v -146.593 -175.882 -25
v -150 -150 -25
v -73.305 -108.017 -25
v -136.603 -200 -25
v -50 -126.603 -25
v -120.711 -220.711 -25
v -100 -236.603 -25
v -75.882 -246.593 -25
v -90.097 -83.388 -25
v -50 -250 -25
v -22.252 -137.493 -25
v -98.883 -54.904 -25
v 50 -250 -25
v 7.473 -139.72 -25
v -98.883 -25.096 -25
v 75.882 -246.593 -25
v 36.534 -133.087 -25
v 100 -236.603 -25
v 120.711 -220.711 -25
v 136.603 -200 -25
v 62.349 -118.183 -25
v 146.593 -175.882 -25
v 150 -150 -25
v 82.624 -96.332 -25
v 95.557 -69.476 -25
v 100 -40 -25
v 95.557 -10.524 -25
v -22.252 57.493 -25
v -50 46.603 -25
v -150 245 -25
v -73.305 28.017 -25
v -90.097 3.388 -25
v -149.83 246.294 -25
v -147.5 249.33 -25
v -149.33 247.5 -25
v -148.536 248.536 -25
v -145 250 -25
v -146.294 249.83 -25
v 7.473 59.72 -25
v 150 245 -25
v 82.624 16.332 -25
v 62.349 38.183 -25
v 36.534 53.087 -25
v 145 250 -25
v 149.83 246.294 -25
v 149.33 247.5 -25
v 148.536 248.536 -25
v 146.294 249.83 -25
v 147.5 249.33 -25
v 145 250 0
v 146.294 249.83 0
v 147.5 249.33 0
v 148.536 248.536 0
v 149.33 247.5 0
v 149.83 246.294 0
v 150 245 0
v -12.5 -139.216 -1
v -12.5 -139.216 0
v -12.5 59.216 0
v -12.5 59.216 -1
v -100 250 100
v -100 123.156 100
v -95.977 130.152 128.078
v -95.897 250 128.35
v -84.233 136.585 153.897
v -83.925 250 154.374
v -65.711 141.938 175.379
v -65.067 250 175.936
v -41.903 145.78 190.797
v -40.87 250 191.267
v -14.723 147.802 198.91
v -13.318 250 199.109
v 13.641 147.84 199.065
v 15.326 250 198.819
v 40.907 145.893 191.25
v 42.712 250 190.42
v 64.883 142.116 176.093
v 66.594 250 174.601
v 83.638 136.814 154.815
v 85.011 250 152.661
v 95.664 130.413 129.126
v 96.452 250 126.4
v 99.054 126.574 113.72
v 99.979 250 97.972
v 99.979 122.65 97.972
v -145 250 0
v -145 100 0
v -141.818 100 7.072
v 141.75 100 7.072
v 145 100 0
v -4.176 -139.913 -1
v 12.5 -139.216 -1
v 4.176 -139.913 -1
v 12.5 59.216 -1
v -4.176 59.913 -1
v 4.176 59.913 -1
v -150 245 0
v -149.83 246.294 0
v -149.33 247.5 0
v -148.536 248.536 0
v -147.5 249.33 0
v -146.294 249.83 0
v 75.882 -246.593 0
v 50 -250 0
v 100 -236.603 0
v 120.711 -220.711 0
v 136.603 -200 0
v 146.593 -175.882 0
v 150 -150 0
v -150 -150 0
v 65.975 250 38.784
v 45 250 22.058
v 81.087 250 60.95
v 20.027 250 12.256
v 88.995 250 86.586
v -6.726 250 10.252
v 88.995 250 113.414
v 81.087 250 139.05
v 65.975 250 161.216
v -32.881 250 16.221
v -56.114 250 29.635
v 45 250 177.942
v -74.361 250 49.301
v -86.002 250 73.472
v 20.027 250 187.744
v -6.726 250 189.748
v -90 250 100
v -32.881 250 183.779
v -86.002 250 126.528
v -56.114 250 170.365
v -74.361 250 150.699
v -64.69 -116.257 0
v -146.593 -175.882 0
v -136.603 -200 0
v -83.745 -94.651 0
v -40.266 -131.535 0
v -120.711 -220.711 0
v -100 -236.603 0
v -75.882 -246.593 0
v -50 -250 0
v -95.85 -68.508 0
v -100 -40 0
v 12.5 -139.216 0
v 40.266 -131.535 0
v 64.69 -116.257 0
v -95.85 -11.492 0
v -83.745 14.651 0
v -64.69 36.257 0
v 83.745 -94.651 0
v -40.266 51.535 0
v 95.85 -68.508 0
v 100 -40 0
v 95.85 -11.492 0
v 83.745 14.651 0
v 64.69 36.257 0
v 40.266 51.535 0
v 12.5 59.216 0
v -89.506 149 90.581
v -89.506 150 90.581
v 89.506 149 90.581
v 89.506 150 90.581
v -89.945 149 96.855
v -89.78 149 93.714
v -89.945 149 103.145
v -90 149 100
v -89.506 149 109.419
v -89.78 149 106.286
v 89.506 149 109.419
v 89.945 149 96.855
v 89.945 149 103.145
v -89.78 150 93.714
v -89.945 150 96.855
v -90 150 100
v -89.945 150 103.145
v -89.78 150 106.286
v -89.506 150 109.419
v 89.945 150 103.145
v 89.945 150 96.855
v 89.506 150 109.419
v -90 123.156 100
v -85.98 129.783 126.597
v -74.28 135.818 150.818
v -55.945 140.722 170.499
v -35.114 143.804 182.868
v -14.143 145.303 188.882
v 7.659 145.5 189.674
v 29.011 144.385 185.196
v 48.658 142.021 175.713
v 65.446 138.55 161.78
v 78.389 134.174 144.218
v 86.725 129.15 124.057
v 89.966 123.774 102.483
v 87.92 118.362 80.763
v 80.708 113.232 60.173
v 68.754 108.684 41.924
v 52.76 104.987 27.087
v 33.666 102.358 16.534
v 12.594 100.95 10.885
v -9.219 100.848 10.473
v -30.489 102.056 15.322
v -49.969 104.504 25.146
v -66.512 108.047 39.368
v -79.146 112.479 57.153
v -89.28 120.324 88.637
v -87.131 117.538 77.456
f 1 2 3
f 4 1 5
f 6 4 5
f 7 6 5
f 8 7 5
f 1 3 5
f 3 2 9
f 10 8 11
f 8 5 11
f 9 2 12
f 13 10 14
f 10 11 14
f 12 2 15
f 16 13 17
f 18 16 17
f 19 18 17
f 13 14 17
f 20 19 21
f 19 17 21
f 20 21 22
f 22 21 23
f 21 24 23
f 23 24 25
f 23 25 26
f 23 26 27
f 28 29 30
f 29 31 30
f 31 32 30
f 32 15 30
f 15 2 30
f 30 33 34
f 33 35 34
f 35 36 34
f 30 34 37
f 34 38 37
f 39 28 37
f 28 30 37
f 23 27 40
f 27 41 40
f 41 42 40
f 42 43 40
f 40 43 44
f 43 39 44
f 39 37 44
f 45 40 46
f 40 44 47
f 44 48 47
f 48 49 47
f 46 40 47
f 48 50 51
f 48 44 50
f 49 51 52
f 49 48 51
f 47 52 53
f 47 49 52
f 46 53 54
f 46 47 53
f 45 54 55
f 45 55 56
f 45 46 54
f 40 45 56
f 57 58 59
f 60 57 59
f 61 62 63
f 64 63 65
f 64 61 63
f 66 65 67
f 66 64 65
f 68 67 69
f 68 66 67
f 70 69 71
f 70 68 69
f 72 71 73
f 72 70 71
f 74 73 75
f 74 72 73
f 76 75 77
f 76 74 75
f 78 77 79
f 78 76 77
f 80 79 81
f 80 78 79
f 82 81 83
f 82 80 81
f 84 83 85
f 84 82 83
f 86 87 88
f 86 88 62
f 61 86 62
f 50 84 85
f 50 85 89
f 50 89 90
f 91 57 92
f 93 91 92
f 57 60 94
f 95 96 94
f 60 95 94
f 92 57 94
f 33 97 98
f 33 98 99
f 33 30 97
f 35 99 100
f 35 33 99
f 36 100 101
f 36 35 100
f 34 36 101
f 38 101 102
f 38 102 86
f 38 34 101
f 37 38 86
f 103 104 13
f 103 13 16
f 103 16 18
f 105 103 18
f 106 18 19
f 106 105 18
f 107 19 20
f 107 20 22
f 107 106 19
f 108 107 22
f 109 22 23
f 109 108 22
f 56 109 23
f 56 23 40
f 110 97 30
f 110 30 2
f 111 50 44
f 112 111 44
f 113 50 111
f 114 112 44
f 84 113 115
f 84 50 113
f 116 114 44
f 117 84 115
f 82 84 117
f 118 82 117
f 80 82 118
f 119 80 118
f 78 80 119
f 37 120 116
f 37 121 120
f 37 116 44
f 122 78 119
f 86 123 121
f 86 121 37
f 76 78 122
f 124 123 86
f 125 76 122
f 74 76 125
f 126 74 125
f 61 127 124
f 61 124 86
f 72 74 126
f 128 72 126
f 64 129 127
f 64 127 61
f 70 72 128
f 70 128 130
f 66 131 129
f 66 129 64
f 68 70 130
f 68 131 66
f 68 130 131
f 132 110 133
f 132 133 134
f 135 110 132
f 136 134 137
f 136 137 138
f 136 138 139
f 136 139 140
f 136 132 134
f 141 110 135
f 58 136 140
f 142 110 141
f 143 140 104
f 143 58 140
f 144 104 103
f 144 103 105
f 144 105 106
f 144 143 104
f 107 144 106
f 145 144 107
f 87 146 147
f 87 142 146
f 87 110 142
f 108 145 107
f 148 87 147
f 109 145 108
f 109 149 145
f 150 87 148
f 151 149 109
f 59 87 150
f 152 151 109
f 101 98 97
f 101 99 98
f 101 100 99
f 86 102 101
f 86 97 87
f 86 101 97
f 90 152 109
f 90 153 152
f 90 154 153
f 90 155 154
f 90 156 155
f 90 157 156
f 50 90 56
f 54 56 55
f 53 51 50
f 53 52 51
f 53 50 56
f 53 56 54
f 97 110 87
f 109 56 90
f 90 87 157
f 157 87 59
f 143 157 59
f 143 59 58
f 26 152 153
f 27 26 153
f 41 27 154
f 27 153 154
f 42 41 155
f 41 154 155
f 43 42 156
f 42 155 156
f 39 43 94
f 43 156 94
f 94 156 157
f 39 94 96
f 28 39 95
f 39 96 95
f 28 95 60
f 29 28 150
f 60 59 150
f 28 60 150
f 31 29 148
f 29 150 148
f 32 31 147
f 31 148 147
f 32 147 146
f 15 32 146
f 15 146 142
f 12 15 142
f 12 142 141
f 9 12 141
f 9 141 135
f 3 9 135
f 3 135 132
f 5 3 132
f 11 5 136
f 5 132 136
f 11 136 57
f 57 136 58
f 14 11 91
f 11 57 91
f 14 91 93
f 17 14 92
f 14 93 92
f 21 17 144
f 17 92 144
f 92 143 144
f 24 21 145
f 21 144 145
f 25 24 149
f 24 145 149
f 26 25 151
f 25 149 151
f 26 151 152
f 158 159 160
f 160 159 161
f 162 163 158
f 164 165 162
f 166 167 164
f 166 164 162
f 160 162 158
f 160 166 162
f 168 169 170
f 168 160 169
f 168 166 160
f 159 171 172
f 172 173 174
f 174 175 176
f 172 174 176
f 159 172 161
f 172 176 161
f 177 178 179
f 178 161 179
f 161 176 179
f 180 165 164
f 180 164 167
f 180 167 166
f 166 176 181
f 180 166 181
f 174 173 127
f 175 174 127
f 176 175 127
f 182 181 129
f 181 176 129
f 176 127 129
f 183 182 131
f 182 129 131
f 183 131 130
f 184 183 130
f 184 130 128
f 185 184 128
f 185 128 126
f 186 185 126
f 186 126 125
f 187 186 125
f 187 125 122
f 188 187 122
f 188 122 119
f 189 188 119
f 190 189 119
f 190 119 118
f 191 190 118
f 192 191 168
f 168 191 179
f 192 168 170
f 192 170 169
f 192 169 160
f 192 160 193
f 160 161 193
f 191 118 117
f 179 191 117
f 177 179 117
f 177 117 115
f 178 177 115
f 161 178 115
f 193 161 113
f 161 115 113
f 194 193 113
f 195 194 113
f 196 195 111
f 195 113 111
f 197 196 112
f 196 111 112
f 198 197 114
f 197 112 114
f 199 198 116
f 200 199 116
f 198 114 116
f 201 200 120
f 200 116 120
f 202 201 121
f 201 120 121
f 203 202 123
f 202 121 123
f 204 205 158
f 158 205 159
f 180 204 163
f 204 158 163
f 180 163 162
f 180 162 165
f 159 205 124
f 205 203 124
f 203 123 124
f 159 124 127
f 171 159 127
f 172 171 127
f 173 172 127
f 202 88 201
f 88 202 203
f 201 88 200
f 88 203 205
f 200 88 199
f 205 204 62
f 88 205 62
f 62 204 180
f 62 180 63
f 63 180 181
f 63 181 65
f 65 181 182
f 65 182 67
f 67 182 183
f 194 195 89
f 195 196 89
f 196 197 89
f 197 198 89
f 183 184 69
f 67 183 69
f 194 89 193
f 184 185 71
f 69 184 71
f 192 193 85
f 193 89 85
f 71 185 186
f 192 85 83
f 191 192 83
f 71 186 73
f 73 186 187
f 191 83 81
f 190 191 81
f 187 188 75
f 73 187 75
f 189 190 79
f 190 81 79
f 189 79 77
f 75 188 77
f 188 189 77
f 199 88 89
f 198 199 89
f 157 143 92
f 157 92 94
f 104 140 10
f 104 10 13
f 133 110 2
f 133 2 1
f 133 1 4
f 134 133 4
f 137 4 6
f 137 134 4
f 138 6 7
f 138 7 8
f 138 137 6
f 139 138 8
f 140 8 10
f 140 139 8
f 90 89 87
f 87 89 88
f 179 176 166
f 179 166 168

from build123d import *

# Parameters (mm, degrees)
F0_R      = 100
F1_DEPTH  = 25
F2_R      = 5
F3_R      = 90
F4_DEPTH  = 150
F6_DEPTH  = 300.001
F7_W      = 25
F7_H      = 200
F8_DEPTH  = 1
F10_W     = 180
F10_H     = 18.838352
F11_DEPTH = 1


with BuildPart() as f1:
    # F0 (on Top) → F1 (new body)
    with BuildSketch(Plane.XY):
        with BuildLine():
            ThreePointArc((-150, -150), (-120.710678, -220.710678), (-50, -250))
            Line((-50, -250), (50, -250))
            ThreePointArc((50, -250), (120.710678, -220.710678), (150, -150))
            Line((150, -150), (150, 250))
            Line((150, 250), (-150, 250))
            Line((-150, 250), (-150, -150))
        make_face()
        with Locations((0, -40)):
            Circle(F0_R, mode=Mode.SUBTRACT)
    extrude(amount=-F1_DEPTH)

    # F2
    f2_edges = [f1.edges().sort_by_distance(p)[0] for p in [
        (150, 250, -12.5),
        (-150, 250, -12.5),
    ]]
    fillet(f2_edges, radius=F2_R)

    # F3 (on face) → F4 (join)
    with BuildSketch(Plane(origin=(0, 250, 0), x_dir=(-1, 0, 0), z_dir=(0, 1, 0))):
        with BuildLine():
            ThreePointArc((-99.979435, 97.972075), (1.014014, 0.005141), (100, 100))
            ThreePointArc((100, 100), (-1.014014, 199.994859), (-99.979435, 97.972075))
        make_face()
        with Locations((0, 100)):
            Circle(F3_R, mode=Mode.SUBTRACT)
        with BuildLine():
            ThreePointArc((0, 0), (-69.990026, 28.575941), (-99.979435, 97.972075))
            Line((-99.979435, 97.972075), (-145, 0))
            Line((-145, 0), (0, 0))
        make_face()
        with BuildLine():
            Line((145, 0), (100, 100))
            ThreePointArc((100, 100), (70.710678, 29.289322), (0, 0))
            Line((0, 0), (145, 0))
        make_face()
    extrude(amount=-F4_DEPTH)

    # F5 (on face) → F6 (cut, through all)
    with BuildSketch(Plane.YZ.offset(150)):
        Polygon((98.237798, 200.659841), (98.237798, 0), (148.237798, 200.659841), align=None)
    extrude(amount=-F6_DEPTH, mode=Mode.SUBTRACT)

    # F7 (on face) → F8 (join)
    with BuildSketch(Plane.XY):
        with Locations((0, -40)):
            Rectangle(F7_W, F7_H)
    extrude(amount=-F8_DEPTH)

    # F10 (on offset) → F11 (join)
    with BuildSketch(Plane.XZ.offset(-150)):
        with Locations((0, 100)):
            Rectangle(F10_W, F10_H)
    extrude(amount=F11_DEPTH)


solid = f1.part
